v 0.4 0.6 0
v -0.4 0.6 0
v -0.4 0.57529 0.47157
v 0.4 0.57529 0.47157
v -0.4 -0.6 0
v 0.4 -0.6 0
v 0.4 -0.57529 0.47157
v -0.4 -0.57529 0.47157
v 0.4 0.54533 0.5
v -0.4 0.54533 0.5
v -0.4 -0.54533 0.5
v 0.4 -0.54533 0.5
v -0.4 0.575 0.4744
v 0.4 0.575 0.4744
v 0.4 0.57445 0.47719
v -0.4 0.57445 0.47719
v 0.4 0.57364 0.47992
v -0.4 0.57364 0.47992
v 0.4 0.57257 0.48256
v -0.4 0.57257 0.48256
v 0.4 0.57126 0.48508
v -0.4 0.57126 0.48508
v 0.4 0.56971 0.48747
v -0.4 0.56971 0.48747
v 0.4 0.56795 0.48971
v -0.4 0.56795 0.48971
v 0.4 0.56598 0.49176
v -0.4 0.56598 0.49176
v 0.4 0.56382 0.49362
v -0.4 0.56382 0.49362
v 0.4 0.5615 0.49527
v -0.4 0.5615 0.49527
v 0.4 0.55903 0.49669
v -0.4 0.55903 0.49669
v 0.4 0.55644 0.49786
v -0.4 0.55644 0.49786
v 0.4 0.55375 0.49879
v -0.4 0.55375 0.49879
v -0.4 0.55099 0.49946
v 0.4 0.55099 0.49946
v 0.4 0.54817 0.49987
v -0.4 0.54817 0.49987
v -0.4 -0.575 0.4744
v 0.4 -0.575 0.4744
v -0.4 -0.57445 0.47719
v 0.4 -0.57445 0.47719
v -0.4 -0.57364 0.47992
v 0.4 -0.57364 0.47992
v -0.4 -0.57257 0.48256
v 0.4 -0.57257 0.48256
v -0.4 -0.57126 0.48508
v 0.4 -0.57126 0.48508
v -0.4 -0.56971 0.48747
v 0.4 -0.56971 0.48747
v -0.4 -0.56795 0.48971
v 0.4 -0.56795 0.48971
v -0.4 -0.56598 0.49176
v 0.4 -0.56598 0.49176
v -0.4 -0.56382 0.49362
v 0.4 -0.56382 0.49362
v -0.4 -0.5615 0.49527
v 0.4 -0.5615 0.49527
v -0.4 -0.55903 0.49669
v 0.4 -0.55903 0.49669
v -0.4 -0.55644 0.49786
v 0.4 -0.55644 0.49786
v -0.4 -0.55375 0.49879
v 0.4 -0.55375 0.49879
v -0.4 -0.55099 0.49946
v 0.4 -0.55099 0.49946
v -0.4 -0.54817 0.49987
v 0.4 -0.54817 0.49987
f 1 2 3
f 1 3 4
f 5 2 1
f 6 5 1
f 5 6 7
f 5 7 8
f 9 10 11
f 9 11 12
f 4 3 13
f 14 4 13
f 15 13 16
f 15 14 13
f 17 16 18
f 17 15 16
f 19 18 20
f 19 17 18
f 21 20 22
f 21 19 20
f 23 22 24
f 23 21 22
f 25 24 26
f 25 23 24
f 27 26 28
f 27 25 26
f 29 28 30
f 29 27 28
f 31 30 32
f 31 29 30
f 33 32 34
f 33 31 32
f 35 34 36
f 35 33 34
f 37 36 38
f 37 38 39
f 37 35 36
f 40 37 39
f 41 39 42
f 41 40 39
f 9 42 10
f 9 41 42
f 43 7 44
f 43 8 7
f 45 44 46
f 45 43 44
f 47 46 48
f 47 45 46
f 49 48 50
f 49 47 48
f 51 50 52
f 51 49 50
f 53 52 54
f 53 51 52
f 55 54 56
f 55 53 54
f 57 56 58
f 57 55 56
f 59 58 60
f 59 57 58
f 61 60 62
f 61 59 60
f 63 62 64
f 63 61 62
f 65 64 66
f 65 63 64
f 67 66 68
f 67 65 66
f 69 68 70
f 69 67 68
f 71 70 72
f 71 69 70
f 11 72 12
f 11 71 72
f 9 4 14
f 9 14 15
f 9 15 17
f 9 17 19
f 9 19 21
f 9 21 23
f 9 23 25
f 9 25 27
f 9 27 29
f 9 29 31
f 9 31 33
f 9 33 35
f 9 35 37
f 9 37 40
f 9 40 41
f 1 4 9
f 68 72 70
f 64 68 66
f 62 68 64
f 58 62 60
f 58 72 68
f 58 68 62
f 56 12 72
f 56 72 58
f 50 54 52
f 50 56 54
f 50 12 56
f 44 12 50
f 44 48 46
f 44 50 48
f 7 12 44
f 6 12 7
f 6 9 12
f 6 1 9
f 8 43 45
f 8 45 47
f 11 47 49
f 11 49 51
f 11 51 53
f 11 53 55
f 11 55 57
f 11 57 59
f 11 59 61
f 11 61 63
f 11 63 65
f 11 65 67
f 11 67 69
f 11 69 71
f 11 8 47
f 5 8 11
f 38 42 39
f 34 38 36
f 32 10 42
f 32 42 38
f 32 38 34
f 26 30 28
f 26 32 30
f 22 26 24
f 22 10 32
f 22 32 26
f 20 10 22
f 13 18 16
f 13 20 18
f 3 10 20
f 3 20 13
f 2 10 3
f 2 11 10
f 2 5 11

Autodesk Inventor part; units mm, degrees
ref_plane "YZ Plane" through (0, 0, 0) normal (1, 0, 0) x (0, 1, 0)
ref_plane "XZ Plane" through (0, 0, 0) normal (0, 1, 0) x (-1, 0, 0)
ref_plane "XY Plane" through (0, 0, 0) normal (0, 0, 1) x (1, 0, 0)
sketch "Sketch1" plane through (0, 0, 0) normal (0, 0, 1) x (1, 0, 0)
  line L0 (0.4, -0.6) -> (-0.4, -0.6)
  line L1 (-0.4, -0.6) -> (-0.4, 0.6)
  line L2 (-0.4, 0.6) -> (0.4, 0.6)
  line L3 (0.4, 0.6) -> (0.4, -0.6)
  line L4 (0.4, -0.6) -> (-0.4, 0.6) construction
  line L5 (-0.4, -0.6) -> (0.4, 0.6) construction
  point P0 (0, 0)
  dimension "d0" = 0.8
  dimension "d1" = 1.2
extrude "Extrusion1" add sketch "Sketch1" along normal blind 0.5
draft "FaceDraft1" angle -3 pull direction (0, 0, -1) faces at (0.1333, -0.6, 0.1667) fixed edges at (0, -0.6, 0)
draft "FaceDraft2" angle -3 pull direction (0, 0, -1) faces at (-0.1333, 0.6, 0.1667) fixed edges at (0, 0.6, 0)
fillet "Fillet1" radius 0.03 2 edges at (0, -0.5738, 0.5) (0, 0.5738, 0.5)
properties part number "LED0603-Top"
